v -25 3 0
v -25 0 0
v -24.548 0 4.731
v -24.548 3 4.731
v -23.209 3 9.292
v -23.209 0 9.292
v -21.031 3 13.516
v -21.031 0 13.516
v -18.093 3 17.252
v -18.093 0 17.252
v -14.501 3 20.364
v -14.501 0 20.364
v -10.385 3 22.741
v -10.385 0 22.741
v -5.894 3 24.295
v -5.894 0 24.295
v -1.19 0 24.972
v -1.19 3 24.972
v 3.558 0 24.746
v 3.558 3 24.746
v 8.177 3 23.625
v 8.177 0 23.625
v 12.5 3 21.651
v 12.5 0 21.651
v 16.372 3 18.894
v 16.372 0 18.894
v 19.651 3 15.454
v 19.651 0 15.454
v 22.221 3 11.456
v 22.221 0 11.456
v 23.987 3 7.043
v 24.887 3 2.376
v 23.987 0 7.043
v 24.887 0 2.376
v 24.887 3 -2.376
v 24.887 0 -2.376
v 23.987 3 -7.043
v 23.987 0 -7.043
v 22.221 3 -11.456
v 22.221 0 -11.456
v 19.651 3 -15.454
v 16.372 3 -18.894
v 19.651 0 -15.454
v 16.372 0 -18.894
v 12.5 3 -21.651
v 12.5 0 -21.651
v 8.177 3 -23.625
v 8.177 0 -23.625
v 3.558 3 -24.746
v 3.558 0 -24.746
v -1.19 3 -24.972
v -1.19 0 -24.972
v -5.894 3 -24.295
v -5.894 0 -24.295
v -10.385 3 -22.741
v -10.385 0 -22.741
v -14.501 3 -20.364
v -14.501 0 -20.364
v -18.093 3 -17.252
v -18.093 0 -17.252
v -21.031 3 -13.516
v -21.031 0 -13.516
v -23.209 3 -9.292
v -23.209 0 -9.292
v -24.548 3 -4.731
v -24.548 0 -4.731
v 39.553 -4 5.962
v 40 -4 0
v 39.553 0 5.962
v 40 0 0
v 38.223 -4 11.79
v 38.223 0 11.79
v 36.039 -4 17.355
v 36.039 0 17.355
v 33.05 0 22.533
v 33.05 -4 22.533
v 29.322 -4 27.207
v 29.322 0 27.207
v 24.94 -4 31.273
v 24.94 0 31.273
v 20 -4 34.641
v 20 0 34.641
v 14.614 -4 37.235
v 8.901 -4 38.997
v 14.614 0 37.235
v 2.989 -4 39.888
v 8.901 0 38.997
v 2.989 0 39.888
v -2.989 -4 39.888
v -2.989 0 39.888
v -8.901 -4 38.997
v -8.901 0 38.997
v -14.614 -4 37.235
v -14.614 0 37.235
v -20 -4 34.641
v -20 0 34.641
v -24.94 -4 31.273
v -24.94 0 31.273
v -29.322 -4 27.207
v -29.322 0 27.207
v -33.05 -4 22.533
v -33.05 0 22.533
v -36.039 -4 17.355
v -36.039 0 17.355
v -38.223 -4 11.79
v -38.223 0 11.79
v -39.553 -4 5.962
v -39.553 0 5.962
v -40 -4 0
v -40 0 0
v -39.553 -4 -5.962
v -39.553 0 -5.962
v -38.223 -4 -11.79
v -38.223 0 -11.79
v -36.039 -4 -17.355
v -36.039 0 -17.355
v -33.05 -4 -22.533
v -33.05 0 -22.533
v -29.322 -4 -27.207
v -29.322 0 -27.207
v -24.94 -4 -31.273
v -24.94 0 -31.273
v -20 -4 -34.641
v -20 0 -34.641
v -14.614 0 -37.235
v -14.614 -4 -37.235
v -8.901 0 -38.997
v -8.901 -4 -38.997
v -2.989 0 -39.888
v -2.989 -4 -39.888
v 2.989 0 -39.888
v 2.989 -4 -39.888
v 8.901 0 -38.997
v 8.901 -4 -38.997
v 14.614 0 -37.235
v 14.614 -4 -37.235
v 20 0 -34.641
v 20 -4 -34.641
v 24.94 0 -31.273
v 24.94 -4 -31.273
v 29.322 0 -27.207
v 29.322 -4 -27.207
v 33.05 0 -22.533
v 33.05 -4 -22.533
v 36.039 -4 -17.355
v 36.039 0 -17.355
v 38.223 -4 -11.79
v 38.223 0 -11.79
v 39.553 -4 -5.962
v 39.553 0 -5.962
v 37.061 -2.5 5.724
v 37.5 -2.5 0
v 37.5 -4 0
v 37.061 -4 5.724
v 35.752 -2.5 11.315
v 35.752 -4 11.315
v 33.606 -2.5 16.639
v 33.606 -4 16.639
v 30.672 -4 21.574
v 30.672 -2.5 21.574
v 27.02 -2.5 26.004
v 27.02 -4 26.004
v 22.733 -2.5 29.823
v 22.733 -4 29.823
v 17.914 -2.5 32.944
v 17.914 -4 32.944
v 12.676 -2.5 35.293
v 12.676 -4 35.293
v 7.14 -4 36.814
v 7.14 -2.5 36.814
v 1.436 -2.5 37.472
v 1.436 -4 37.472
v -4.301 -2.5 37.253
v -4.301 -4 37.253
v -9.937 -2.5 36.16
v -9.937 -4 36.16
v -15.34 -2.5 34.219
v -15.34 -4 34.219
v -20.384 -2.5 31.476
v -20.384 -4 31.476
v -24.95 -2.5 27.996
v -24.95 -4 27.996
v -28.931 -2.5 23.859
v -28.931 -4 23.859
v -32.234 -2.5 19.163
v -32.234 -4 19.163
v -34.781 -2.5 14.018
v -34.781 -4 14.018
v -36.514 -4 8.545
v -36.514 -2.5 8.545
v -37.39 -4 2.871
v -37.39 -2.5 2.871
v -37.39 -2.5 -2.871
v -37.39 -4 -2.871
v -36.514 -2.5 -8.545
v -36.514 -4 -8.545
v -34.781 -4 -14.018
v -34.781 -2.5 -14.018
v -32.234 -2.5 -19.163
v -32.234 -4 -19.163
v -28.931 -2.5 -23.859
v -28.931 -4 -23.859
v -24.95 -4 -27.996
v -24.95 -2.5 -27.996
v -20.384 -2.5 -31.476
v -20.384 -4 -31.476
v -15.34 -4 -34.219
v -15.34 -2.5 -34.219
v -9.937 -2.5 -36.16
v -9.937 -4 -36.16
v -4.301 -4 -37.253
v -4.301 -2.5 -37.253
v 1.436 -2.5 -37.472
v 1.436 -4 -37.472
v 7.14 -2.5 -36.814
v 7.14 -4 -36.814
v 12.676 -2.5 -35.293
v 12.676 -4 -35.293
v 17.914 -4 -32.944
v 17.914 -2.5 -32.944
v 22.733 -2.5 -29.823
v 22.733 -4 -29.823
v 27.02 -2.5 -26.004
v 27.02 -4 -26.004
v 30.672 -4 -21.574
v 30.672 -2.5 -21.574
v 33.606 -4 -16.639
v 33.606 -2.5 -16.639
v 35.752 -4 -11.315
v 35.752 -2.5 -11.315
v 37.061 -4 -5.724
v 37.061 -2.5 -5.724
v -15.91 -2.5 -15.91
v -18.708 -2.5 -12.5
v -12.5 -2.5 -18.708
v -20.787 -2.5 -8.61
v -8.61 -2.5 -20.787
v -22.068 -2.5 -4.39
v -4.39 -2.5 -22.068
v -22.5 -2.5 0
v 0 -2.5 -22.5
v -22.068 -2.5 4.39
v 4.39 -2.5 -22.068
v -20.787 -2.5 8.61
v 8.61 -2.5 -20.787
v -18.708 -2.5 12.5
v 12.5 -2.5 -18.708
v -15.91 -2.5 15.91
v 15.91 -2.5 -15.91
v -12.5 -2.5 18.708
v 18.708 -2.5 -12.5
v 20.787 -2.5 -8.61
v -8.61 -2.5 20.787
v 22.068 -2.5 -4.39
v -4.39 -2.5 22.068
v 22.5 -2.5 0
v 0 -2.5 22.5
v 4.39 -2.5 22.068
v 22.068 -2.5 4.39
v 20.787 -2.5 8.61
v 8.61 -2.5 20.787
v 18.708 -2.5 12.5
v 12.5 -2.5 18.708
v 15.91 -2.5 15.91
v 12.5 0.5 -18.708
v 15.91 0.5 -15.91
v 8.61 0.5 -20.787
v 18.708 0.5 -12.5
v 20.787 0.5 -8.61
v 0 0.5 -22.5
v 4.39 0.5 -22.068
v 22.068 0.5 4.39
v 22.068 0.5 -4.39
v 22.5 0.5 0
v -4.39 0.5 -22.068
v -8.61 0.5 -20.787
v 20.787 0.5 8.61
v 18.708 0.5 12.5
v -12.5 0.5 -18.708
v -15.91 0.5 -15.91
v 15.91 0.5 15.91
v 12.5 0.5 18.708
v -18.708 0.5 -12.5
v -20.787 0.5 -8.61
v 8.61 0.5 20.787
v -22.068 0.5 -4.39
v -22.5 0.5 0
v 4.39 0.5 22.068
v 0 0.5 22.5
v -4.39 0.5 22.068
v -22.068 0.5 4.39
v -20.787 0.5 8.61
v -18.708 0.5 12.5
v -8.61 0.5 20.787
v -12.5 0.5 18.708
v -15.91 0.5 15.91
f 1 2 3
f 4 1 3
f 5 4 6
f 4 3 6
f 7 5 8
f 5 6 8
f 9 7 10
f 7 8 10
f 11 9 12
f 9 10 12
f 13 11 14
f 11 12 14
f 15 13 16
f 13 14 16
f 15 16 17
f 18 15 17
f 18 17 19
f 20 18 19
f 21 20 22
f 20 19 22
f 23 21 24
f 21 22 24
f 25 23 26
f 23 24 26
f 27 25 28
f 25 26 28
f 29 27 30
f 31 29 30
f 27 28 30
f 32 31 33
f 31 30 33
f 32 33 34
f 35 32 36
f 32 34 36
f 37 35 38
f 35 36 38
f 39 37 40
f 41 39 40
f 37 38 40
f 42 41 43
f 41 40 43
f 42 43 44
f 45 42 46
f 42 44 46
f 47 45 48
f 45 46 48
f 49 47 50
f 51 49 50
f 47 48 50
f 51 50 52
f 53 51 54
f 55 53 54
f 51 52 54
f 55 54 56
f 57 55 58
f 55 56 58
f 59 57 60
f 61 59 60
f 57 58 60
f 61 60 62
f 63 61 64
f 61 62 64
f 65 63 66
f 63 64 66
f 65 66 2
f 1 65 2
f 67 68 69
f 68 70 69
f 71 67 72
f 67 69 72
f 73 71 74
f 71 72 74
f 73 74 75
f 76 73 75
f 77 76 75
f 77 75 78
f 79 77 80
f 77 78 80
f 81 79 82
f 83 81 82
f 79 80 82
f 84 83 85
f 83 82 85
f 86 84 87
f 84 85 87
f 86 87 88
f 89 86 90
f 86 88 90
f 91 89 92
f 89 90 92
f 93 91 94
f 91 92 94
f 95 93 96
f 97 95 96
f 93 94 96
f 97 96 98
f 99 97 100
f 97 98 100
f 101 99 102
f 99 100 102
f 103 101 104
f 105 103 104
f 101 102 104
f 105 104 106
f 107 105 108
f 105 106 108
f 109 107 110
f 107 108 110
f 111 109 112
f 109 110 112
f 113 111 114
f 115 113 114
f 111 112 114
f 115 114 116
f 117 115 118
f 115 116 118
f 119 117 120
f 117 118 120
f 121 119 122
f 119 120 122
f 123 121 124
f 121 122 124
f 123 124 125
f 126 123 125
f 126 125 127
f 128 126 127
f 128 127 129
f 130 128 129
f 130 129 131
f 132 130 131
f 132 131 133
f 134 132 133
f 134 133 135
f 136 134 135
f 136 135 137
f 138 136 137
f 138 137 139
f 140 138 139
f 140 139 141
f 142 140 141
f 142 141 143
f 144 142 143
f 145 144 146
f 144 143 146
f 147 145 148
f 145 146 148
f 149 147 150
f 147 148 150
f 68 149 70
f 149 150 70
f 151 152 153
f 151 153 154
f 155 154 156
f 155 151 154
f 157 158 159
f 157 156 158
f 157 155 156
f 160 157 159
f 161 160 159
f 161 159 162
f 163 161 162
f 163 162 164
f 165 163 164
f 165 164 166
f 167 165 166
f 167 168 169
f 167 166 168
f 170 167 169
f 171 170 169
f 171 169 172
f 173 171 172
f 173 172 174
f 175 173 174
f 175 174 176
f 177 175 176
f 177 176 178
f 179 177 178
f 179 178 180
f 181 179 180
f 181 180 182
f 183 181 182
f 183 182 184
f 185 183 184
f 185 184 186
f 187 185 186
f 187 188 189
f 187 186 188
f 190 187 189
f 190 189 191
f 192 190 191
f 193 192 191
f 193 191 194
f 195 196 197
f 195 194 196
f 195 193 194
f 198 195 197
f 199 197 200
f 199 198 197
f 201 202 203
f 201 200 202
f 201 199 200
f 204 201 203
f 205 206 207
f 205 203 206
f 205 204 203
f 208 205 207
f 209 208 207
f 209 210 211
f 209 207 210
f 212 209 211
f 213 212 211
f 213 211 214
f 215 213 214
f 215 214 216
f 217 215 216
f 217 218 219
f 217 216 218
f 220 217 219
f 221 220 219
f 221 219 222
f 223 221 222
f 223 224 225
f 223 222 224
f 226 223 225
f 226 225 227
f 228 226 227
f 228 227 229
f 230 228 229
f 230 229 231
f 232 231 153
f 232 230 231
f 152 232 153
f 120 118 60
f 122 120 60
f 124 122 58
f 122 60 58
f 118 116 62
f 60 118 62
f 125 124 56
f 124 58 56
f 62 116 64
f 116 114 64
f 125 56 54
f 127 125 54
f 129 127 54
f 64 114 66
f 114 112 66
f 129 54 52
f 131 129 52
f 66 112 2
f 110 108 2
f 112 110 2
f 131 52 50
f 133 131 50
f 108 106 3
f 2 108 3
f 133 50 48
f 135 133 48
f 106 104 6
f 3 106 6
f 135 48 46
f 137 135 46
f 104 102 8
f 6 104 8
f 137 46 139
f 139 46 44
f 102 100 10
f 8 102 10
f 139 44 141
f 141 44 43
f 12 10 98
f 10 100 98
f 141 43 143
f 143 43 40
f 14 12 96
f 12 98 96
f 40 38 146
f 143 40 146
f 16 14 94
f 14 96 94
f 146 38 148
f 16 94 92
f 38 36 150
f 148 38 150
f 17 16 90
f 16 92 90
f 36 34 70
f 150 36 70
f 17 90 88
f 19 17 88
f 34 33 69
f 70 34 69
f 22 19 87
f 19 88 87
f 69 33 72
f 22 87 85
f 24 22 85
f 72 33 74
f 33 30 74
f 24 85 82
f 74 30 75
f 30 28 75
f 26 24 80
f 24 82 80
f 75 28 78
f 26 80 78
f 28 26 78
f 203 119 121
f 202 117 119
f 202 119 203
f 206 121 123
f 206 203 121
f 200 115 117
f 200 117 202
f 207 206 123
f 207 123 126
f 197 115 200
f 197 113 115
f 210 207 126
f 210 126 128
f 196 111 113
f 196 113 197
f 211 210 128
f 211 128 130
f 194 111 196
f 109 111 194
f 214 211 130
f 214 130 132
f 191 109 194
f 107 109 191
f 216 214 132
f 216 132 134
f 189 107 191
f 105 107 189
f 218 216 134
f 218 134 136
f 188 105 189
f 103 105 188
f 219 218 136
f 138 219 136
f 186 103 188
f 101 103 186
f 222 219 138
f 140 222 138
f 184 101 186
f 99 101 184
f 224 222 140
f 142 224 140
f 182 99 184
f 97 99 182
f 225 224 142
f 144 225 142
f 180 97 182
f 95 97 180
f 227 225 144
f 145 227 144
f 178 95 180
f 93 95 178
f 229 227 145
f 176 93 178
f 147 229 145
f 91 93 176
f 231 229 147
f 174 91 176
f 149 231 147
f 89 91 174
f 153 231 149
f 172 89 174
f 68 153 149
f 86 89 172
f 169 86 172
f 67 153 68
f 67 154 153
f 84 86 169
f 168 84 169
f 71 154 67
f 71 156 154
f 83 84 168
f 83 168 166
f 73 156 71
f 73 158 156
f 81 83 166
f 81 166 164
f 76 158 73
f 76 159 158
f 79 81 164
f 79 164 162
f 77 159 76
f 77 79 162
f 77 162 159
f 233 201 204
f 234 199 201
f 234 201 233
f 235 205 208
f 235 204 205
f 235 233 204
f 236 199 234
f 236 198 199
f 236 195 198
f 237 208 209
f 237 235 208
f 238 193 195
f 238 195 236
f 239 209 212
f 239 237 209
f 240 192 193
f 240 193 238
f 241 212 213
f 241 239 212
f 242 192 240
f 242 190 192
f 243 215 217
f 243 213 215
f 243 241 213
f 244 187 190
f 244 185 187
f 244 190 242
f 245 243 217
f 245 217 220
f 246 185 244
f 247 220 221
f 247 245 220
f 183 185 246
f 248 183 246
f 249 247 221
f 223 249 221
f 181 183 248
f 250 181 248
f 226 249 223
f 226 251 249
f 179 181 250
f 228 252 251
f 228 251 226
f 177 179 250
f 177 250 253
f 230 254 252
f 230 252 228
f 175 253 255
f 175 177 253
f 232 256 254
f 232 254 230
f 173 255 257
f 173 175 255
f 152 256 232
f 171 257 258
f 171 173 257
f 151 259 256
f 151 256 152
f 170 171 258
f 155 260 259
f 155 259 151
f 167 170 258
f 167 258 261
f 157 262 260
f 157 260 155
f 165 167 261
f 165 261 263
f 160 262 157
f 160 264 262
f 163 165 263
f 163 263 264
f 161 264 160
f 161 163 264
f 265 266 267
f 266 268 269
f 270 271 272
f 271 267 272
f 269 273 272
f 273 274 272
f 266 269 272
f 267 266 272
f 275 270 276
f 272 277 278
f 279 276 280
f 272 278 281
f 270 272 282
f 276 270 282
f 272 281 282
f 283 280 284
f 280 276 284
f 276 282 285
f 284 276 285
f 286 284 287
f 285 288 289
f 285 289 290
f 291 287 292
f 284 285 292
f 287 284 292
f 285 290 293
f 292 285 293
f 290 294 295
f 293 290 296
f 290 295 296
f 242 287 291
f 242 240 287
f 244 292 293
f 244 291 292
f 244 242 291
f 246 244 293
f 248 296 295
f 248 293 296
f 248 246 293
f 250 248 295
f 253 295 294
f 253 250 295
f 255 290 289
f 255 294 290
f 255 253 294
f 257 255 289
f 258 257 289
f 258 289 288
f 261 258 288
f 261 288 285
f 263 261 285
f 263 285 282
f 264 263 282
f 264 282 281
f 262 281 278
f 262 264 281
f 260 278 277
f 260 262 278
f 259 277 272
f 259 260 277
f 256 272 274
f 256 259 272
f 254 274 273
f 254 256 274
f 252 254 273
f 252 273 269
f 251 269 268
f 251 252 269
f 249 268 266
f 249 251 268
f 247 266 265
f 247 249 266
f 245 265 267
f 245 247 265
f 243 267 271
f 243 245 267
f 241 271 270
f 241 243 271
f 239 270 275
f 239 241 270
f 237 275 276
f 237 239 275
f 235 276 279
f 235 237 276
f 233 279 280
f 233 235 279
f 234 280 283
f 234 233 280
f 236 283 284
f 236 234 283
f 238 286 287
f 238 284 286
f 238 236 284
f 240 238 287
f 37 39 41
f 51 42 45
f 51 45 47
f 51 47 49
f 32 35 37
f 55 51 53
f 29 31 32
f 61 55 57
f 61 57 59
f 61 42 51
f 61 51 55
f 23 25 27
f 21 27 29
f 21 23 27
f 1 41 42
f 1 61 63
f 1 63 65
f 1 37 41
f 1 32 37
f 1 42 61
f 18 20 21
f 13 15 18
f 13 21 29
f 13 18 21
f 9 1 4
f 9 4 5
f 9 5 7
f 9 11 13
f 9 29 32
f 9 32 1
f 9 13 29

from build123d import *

# Parameters (mm, degrees)
F0_R     = 40
F1_DEPTH = 3
F2_DEPTH = 1
F3_R     = 25
F4_DEPTH = 3
F5_T     = -2.5


with BuildPart() as f1:
    # F0 (on Front) → F1 (new body)
    with BuildSketch(Plane.XZ):
        Circle(F0_R)
    extrude(amount=F1_DEPTH)

    # F2 (add): a face of the model
    f2_faces = [f1.faces().sort_by_distance(p)[0] for p in [
        (0, -3, 0),
    ]]
    extrude(f2_faces, amount=F2_DEPTH)

    # F3 (on face) → F4 (join)
    with BuildSketch(Plane(origin=(0, 0, 0), x_dir=(-1, 0, 0), z_dir=(0, 1, 0))):
        Circle(F3_R)
    extrude(amount=F4_DEPTH)

    # F5
    f5_openings = [f1.faces().sort_by_distance(p)[0] for p in [
        (0, -4, 0),
    ]]
    offset(amount=F5_T, openings=f5_openings, kind=Kind.INTERSECTION)


solid = f1.part
